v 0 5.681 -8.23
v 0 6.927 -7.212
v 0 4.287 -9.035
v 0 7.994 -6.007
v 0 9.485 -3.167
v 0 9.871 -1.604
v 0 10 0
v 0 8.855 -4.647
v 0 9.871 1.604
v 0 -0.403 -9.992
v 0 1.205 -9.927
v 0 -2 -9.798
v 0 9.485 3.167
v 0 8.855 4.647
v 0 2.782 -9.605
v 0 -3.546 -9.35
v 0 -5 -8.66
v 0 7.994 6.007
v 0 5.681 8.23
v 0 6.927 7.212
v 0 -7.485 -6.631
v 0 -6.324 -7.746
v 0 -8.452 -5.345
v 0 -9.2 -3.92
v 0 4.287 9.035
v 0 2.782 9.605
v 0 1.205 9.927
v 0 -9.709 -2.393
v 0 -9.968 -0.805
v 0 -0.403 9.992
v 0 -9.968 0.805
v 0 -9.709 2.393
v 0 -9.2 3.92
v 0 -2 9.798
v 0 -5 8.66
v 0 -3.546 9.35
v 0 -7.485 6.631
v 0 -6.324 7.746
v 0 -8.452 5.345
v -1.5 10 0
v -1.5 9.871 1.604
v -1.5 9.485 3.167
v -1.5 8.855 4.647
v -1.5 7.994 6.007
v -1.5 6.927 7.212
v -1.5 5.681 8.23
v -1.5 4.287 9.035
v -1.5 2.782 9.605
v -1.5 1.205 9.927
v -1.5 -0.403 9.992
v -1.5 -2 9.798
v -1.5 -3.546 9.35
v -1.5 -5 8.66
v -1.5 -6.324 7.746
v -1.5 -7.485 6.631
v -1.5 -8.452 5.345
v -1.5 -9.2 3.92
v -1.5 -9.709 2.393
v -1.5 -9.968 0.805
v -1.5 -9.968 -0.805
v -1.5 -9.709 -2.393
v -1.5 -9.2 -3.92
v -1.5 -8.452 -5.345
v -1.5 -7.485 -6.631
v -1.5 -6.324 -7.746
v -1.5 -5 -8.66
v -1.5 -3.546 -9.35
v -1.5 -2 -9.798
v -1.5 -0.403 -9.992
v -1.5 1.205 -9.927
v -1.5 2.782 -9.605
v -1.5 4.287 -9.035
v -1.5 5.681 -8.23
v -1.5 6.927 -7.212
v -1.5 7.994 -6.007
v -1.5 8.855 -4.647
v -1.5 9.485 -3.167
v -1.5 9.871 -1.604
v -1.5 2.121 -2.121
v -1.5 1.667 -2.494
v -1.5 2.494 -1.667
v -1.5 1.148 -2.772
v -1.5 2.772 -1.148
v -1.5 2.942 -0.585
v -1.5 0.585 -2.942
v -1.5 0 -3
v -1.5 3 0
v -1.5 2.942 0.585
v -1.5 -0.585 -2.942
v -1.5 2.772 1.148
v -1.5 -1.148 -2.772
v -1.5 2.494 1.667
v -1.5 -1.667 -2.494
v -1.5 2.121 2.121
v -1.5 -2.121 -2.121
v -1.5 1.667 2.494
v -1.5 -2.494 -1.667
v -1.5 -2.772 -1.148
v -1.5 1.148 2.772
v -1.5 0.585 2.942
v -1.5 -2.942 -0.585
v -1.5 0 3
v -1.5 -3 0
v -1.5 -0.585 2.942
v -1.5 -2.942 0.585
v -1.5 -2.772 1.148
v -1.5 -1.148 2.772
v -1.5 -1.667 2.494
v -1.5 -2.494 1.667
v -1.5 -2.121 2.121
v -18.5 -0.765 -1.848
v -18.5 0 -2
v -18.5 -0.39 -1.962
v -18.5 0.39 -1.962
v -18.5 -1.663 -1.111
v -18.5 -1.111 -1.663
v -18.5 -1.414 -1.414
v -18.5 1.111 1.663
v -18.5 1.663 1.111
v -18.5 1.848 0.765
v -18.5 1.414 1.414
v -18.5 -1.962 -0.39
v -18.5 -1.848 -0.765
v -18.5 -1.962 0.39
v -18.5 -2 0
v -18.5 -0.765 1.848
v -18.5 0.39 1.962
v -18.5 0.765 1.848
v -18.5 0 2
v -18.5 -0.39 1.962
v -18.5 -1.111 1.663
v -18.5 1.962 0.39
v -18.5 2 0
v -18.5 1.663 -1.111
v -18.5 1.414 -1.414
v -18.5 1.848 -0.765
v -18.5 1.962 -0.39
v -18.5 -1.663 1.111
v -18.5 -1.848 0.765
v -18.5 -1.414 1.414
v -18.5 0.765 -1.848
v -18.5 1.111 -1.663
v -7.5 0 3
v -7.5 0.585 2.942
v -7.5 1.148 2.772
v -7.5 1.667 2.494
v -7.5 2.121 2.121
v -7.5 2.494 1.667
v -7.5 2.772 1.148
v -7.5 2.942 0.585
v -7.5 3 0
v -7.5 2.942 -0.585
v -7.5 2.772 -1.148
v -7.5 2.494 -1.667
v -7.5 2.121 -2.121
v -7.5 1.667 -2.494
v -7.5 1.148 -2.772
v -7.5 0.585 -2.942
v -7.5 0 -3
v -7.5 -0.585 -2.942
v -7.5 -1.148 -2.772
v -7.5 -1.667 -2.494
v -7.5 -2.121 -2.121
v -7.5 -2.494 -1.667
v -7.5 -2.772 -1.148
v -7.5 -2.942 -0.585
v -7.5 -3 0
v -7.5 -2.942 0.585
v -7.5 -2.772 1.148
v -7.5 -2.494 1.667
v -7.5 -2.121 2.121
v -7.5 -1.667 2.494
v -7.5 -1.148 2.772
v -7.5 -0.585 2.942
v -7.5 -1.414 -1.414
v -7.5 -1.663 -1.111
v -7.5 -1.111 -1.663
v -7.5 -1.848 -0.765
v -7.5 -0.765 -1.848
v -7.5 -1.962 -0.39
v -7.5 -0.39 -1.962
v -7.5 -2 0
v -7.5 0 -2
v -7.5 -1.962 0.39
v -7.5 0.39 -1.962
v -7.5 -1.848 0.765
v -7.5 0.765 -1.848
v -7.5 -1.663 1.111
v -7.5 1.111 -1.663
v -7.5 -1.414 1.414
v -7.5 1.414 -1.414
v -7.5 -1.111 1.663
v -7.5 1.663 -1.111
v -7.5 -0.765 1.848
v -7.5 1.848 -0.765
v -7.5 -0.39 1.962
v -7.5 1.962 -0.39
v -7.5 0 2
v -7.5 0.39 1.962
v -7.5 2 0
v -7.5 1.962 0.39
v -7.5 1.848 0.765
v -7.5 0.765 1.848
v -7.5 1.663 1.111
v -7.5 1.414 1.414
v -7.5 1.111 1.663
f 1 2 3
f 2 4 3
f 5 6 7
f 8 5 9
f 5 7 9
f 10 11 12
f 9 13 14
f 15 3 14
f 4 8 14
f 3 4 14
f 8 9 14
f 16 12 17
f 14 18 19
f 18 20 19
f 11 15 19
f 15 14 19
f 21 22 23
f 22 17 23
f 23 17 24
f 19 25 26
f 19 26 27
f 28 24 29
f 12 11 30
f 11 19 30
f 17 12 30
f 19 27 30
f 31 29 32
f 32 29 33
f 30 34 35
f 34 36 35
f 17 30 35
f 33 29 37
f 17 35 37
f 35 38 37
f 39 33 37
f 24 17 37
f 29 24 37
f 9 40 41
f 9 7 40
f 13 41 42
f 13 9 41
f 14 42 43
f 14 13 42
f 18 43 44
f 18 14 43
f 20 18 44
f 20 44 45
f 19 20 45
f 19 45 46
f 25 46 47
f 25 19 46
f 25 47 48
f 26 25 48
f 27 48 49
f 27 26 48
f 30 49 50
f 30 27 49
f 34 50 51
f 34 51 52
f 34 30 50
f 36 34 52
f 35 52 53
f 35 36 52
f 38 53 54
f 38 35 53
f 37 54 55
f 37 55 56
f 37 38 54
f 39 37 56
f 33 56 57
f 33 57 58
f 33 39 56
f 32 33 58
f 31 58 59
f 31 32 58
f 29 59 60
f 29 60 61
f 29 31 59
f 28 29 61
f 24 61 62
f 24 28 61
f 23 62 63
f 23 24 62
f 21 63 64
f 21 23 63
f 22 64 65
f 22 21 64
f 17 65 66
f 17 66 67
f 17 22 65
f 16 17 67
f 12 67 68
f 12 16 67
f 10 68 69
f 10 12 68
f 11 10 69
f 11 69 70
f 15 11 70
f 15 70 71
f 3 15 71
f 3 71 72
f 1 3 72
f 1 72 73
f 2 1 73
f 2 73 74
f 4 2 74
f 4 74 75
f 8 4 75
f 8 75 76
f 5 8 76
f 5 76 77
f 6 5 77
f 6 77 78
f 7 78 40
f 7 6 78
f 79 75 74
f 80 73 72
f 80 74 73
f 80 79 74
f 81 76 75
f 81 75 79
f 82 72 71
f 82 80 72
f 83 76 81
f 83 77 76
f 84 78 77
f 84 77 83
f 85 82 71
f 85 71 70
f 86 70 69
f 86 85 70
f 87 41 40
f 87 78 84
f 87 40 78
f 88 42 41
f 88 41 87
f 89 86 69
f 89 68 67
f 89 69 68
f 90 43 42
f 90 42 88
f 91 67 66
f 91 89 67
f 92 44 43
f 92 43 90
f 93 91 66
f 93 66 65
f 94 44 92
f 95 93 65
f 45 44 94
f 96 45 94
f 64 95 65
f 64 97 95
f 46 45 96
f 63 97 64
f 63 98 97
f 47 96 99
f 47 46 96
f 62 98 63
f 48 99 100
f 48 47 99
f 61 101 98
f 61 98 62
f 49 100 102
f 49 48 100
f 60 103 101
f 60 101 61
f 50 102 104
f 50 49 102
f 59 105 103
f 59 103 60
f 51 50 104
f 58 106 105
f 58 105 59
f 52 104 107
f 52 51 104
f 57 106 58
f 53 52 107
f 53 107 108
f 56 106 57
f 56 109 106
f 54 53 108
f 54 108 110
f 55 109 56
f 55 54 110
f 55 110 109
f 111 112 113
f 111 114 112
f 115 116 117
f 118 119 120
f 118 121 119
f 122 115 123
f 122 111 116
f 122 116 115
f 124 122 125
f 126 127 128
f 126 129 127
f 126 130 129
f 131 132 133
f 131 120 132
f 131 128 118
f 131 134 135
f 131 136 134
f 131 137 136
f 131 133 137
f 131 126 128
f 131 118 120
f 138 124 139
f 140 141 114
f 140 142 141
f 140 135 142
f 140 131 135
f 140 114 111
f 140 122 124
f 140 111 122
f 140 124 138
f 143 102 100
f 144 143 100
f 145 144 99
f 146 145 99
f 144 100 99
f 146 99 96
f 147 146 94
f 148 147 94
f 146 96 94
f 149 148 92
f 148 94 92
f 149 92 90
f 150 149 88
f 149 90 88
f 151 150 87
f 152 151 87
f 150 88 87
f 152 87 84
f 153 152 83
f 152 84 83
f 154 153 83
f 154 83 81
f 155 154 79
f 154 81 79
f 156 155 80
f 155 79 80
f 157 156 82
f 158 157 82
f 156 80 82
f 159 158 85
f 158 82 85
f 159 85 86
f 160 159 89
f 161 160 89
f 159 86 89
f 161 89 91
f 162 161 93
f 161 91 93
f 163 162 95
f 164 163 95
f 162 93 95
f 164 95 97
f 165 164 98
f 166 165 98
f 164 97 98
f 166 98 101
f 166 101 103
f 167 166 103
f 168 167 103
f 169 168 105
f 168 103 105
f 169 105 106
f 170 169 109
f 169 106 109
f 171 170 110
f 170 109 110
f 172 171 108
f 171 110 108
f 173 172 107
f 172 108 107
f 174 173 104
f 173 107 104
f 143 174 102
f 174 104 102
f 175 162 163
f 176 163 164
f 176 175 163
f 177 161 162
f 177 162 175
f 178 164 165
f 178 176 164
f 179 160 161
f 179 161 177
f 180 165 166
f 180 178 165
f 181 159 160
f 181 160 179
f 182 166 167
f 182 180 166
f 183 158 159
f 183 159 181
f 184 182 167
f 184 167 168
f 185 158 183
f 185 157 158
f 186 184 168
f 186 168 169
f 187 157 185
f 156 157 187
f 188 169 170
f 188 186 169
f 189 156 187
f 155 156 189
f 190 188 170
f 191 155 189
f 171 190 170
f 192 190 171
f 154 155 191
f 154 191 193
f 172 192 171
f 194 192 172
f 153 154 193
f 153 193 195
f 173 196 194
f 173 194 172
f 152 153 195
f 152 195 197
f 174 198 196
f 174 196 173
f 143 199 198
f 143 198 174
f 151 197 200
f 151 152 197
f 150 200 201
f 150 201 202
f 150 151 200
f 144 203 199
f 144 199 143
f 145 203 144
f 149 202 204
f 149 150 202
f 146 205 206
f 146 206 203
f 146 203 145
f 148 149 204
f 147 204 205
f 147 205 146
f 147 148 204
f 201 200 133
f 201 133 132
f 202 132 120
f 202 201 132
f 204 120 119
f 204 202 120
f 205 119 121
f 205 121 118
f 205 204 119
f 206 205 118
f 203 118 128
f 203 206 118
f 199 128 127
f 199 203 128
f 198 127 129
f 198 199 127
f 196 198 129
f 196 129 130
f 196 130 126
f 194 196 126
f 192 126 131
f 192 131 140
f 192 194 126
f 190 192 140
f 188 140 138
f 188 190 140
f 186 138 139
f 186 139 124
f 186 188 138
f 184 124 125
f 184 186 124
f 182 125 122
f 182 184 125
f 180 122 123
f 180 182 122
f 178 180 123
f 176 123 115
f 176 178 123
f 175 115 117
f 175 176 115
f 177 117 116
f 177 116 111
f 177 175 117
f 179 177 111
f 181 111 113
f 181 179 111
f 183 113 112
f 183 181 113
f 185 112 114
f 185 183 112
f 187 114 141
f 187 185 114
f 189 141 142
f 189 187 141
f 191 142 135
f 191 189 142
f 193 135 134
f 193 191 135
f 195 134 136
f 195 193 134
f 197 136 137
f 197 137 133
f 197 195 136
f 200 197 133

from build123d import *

# Parameters (mm, degrees)
SKETCH_2_R      = 3
EXTRUDE_1_DEPTH = 6


with BuildPart() as part:
    # 草图1 → 旋转1 (revolve)
    with BuildSketch(Plane.XY):
        Polygon((-18.5, 0), (-18.5, 2), (-1.5, 2), (-1.5, 10), (0, 10), (0, 2), (0, 0), align=None)
    revolve(axis=Axis((-18.5, 0, 0), (1, 0, 0)))

    # 草图2 → 凸台-拉伸1 (add)
    with BuildSketch(Plane.ZY.offset(1.5)):
        Circle(SKETCH_2_R)
    extrude(amount=EXTRUDE_1_DEPTH)


solid = part.part
